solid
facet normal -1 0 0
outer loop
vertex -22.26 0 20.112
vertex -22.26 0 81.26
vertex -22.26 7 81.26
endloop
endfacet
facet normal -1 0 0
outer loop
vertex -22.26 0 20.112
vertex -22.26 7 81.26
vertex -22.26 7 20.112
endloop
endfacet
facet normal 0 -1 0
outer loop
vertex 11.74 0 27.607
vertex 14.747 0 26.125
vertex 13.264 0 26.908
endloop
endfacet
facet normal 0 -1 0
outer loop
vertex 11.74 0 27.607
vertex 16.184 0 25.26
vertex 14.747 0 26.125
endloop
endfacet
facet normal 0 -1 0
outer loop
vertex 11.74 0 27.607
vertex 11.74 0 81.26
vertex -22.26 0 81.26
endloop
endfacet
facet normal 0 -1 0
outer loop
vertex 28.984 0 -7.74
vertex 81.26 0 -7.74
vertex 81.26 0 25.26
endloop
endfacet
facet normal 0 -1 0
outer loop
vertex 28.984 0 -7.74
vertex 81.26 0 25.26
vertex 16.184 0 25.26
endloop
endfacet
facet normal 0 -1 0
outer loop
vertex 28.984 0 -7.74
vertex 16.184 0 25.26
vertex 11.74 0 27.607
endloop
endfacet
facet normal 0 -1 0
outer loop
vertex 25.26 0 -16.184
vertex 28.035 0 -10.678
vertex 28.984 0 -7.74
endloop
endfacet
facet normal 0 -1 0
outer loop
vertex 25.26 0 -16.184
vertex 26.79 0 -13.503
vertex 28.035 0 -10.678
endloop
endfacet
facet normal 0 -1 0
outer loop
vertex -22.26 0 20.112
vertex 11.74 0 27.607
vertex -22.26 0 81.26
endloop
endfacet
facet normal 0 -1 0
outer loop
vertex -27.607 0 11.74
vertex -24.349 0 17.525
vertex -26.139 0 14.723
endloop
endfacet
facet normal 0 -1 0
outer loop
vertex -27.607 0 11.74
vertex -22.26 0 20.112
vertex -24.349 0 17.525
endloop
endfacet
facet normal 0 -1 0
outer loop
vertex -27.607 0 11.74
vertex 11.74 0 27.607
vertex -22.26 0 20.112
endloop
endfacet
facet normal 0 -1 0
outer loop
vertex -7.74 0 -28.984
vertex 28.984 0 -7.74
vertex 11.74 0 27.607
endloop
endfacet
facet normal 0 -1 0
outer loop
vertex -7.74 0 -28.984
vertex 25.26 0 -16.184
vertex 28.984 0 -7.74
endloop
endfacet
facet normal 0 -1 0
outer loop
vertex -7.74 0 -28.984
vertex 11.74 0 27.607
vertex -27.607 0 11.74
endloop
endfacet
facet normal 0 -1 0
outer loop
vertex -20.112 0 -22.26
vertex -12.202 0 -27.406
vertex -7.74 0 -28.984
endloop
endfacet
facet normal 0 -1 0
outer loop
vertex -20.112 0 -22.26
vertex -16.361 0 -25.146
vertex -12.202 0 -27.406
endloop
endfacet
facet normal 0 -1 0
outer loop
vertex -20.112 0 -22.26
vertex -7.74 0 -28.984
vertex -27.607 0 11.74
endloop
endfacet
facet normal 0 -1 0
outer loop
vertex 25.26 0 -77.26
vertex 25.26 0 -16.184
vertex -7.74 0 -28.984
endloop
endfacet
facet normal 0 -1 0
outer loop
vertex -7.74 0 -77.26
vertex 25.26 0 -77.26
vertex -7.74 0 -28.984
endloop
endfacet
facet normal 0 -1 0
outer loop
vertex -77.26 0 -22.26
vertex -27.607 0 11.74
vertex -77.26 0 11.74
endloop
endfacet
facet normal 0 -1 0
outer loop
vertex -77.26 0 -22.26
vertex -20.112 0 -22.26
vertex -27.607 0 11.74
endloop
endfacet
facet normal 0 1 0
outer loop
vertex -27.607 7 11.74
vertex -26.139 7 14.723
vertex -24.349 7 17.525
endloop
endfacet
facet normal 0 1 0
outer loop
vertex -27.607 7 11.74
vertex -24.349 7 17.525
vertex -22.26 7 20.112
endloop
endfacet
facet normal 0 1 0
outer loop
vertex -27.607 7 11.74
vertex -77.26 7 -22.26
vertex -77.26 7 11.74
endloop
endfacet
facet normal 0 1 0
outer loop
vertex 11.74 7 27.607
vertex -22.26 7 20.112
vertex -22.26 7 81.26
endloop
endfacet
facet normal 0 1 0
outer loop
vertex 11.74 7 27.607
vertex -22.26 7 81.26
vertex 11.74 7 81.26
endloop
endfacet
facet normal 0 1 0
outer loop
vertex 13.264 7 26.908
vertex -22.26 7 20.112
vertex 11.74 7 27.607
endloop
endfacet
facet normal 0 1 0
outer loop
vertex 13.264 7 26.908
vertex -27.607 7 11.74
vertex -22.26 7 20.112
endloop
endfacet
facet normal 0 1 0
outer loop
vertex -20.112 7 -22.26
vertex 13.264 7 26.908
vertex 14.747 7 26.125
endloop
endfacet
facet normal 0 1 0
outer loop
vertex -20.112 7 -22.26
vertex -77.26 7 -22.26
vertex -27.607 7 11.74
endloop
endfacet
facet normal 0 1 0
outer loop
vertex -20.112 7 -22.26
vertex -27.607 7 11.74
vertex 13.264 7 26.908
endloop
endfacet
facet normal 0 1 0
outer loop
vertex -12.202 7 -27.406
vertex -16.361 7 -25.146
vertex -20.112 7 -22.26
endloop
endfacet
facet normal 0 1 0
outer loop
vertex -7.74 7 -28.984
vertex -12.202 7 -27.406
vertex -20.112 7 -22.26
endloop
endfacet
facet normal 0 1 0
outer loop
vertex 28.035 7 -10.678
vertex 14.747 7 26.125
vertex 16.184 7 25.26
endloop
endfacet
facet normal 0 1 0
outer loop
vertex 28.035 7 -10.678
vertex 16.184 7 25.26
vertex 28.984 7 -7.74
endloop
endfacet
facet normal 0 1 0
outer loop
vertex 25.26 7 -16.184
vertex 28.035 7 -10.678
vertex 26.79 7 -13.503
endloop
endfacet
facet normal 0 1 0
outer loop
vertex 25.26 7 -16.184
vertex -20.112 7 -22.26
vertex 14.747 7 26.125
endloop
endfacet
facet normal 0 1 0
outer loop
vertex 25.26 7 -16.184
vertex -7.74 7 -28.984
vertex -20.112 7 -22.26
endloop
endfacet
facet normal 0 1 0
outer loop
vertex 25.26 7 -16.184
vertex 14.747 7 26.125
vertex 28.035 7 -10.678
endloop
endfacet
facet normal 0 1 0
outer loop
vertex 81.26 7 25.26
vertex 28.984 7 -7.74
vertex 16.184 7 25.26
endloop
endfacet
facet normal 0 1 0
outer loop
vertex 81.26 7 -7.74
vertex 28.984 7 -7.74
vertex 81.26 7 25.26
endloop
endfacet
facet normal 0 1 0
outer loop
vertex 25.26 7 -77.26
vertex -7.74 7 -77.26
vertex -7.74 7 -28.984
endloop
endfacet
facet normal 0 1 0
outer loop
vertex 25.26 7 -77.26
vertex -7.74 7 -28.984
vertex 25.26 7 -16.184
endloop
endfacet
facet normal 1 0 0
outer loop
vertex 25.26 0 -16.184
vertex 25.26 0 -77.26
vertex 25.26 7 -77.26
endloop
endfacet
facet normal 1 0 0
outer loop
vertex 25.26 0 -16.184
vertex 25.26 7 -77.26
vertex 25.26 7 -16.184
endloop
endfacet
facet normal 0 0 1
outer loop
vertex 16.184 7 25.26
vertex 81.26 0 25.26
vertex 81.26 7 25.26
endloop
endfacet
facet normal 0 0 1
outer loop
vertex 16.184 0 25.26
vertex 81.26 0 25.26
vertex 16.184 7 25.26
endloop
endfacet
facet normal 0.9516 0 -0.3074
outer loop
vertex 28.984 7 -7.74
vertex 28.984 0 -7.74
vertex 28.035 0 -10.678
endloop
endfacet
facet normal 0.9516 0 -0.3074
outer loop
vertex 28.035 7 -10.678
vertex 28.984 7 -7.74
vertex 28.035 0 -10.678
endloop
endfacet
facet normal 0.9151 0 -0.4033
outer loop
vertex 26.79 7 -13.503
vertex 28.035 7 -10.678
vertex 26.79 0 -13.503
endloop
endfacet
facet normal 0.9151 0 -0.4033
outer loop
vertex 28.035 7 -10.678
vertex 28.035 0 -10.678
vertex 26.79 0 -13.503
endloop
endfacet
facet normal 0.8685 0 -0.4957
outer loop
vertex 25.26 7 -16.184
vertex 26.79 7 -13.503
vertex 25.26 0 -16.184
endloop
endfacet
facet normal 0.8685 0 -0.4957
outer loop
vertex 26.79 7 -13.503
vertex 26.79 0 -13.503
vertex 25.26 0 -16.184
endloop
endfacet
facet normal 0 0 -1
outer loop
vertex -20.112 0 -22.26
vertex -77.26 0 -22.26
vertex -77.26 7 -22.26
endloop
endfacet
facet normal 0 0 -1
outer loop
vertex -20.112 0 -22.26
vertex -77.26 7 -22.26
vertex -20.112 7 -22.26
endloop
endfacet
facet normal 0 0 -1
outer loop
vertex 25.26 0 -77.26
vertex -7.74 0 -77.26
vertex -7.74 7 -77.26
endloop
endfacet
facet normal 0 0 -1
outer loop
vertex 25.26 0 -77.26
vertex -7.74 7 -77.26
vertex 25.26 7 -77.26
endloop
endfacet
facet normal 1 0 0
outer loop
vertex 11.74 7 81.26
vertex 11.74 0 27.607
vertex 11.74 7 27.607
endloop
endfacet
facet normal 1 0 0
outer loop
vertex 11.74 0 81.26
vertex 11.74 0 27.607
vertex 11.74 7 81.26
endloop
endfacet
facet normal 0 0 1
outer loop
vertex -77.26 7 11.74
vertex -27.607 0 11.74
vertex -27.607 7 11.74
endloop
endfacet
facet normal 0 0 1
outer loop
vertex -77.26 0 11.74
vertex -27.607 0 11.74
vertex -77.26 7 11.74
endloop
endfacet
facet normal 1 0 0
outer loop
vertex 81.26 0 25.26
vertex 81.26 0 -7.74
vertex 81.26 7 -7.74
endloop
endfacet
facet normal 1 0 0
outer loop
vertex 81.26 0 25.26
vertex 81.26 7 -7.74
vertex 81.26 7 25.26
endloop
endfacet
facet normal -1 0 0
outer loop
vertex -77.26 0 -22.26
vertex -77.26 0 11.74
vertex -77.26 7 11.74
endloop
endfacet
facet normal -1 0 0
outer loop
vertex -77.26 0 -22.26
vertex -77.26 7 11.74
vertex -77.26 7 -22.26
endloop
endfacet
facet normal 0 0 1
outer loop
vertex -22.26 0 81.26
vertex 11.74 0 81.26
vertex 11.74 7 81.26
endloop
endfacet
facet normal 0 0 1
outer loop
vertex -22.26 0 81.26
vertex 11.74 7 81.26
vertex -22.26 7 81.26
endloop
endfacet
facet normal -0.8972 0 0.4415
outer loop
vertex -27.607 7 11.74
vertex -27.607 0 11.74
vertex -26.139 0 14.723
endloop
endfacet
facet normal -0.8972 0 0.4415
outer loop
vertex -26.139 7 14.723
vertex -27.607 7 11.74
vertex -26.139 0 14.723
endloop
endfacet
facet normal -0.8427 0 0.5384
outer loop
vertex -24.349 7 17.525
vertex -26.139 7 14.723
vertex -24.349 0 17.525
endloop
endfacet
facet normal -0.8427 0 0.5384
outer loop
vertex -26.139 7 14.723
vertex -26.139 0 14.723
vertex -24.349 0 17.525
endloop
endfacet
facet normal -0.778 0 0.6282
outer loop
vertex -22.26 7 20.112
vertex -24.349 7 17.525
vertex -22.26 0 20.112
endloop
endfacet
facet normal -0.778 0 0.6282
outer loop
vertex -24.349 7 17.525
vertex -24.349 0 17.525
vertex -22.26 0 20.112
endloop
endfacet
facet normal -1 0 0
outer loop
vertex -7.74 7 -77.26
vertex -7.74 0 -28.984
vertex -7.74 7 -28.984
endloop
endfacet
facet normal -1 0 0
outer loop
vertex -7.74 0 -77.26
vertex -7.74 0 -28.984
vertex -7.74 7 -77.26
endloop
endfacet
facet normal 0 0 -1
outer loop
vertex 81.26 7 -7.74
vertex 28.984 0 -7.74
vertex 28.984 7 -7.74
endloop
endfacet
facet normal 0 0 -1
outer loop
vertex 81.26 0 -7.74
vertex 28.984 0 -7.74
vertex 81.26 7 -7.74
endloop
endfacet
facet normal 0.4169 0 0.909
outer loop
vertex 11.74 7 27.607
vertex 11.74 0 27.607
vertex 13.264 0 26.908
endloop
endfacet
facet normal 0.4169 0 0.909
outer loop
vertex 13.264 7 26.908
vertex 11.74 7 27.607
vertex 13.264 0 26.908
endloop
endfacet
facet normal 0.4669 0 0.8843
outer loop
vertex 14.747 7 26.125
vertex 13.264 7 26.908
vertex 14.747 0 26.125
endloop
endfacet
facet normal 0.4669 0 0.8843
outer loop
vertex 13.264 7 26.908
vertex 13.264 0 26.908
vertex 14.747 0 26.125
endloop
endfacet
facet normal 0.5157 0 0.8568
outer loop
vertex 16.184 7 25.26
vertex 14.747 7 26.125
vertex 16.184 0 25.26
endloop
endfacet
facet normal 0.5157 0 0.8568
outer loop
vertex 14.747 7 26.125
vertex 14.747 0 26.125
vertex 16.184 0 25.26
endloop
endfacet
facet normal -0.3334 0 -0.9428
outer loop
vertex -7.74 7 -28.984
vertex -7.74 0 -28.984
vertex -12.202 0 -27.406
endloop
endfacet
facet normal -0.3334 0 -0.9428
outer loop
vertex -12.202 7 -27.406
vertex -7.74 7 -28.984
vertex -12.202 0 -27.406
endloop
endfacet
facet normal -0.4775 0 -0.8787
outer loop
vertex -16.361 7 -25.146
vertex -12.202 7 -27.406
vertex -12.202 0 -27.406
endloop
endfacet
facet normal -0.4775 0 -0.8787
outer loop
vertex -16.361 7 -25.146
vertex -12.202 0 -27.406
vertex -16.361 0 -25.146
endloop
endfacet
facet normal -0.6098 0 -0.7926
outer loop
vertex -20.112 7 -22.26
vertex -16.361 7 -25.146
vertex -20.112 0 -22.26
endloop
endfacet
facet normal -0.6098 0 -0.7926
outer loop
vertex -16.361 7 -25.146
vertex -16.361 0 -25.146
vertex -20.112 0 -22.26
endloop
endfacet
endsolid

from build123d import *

# Parameters (mm, degrees)
BOSS_EXTRUDE1_DEPTH = 7
SKETCH2_R           = 30
BOSS_EXTRUDE2_DEPTH = 7


with BuildPart() as part:
    # Sketch1 → Boss-Extrude1 (new body)
    with BuildSketch(Plane(origin=(0, 0, 0), x_dir=(1, 0, 0), z_dir=(0, 1, 0))):
        Polygon((-77.26, -11.74), (-77.26, 22.26), (-7.74, 22.26), (-7.74, 77.26), (25.26, 77.26), (25.26, 7.74), (81.26, 7.74), (81.26, -25.26), (11.74, -25.26), (11.74, -81.26), (-22.26, -81.26), (-22.26, -11.74), align=None)
        with BuildLine():
            Line((-1.65, 1.3), (1.65, 1.3))
            ThreePointArc((1.65, 1.3), (2.188477631, 0), (1.65, -1.3))
            Line((1.65, -1.3), (-1.65, -1.3))
            ThreePointArc((-1.65, -1.3), (-2.188477631, 0), (-1.65, 1.3))
        make_face(mode=Mode.SUBTRACT)
    extrude(amount=BOSS_EXTRUDE1_DEPTH)

    # Sketch2 → Boss-Extrude2 (add)
    with BuildSketch(Plane(origin=(0, 0, 0), x_dir=(1, 0, 0), z_dir=(0, 1, 0))):
        Circle(SKETCH2_R)
    extrude(amount=BOSS_EXTRUDE2_DEPTH)


solid = part.part
